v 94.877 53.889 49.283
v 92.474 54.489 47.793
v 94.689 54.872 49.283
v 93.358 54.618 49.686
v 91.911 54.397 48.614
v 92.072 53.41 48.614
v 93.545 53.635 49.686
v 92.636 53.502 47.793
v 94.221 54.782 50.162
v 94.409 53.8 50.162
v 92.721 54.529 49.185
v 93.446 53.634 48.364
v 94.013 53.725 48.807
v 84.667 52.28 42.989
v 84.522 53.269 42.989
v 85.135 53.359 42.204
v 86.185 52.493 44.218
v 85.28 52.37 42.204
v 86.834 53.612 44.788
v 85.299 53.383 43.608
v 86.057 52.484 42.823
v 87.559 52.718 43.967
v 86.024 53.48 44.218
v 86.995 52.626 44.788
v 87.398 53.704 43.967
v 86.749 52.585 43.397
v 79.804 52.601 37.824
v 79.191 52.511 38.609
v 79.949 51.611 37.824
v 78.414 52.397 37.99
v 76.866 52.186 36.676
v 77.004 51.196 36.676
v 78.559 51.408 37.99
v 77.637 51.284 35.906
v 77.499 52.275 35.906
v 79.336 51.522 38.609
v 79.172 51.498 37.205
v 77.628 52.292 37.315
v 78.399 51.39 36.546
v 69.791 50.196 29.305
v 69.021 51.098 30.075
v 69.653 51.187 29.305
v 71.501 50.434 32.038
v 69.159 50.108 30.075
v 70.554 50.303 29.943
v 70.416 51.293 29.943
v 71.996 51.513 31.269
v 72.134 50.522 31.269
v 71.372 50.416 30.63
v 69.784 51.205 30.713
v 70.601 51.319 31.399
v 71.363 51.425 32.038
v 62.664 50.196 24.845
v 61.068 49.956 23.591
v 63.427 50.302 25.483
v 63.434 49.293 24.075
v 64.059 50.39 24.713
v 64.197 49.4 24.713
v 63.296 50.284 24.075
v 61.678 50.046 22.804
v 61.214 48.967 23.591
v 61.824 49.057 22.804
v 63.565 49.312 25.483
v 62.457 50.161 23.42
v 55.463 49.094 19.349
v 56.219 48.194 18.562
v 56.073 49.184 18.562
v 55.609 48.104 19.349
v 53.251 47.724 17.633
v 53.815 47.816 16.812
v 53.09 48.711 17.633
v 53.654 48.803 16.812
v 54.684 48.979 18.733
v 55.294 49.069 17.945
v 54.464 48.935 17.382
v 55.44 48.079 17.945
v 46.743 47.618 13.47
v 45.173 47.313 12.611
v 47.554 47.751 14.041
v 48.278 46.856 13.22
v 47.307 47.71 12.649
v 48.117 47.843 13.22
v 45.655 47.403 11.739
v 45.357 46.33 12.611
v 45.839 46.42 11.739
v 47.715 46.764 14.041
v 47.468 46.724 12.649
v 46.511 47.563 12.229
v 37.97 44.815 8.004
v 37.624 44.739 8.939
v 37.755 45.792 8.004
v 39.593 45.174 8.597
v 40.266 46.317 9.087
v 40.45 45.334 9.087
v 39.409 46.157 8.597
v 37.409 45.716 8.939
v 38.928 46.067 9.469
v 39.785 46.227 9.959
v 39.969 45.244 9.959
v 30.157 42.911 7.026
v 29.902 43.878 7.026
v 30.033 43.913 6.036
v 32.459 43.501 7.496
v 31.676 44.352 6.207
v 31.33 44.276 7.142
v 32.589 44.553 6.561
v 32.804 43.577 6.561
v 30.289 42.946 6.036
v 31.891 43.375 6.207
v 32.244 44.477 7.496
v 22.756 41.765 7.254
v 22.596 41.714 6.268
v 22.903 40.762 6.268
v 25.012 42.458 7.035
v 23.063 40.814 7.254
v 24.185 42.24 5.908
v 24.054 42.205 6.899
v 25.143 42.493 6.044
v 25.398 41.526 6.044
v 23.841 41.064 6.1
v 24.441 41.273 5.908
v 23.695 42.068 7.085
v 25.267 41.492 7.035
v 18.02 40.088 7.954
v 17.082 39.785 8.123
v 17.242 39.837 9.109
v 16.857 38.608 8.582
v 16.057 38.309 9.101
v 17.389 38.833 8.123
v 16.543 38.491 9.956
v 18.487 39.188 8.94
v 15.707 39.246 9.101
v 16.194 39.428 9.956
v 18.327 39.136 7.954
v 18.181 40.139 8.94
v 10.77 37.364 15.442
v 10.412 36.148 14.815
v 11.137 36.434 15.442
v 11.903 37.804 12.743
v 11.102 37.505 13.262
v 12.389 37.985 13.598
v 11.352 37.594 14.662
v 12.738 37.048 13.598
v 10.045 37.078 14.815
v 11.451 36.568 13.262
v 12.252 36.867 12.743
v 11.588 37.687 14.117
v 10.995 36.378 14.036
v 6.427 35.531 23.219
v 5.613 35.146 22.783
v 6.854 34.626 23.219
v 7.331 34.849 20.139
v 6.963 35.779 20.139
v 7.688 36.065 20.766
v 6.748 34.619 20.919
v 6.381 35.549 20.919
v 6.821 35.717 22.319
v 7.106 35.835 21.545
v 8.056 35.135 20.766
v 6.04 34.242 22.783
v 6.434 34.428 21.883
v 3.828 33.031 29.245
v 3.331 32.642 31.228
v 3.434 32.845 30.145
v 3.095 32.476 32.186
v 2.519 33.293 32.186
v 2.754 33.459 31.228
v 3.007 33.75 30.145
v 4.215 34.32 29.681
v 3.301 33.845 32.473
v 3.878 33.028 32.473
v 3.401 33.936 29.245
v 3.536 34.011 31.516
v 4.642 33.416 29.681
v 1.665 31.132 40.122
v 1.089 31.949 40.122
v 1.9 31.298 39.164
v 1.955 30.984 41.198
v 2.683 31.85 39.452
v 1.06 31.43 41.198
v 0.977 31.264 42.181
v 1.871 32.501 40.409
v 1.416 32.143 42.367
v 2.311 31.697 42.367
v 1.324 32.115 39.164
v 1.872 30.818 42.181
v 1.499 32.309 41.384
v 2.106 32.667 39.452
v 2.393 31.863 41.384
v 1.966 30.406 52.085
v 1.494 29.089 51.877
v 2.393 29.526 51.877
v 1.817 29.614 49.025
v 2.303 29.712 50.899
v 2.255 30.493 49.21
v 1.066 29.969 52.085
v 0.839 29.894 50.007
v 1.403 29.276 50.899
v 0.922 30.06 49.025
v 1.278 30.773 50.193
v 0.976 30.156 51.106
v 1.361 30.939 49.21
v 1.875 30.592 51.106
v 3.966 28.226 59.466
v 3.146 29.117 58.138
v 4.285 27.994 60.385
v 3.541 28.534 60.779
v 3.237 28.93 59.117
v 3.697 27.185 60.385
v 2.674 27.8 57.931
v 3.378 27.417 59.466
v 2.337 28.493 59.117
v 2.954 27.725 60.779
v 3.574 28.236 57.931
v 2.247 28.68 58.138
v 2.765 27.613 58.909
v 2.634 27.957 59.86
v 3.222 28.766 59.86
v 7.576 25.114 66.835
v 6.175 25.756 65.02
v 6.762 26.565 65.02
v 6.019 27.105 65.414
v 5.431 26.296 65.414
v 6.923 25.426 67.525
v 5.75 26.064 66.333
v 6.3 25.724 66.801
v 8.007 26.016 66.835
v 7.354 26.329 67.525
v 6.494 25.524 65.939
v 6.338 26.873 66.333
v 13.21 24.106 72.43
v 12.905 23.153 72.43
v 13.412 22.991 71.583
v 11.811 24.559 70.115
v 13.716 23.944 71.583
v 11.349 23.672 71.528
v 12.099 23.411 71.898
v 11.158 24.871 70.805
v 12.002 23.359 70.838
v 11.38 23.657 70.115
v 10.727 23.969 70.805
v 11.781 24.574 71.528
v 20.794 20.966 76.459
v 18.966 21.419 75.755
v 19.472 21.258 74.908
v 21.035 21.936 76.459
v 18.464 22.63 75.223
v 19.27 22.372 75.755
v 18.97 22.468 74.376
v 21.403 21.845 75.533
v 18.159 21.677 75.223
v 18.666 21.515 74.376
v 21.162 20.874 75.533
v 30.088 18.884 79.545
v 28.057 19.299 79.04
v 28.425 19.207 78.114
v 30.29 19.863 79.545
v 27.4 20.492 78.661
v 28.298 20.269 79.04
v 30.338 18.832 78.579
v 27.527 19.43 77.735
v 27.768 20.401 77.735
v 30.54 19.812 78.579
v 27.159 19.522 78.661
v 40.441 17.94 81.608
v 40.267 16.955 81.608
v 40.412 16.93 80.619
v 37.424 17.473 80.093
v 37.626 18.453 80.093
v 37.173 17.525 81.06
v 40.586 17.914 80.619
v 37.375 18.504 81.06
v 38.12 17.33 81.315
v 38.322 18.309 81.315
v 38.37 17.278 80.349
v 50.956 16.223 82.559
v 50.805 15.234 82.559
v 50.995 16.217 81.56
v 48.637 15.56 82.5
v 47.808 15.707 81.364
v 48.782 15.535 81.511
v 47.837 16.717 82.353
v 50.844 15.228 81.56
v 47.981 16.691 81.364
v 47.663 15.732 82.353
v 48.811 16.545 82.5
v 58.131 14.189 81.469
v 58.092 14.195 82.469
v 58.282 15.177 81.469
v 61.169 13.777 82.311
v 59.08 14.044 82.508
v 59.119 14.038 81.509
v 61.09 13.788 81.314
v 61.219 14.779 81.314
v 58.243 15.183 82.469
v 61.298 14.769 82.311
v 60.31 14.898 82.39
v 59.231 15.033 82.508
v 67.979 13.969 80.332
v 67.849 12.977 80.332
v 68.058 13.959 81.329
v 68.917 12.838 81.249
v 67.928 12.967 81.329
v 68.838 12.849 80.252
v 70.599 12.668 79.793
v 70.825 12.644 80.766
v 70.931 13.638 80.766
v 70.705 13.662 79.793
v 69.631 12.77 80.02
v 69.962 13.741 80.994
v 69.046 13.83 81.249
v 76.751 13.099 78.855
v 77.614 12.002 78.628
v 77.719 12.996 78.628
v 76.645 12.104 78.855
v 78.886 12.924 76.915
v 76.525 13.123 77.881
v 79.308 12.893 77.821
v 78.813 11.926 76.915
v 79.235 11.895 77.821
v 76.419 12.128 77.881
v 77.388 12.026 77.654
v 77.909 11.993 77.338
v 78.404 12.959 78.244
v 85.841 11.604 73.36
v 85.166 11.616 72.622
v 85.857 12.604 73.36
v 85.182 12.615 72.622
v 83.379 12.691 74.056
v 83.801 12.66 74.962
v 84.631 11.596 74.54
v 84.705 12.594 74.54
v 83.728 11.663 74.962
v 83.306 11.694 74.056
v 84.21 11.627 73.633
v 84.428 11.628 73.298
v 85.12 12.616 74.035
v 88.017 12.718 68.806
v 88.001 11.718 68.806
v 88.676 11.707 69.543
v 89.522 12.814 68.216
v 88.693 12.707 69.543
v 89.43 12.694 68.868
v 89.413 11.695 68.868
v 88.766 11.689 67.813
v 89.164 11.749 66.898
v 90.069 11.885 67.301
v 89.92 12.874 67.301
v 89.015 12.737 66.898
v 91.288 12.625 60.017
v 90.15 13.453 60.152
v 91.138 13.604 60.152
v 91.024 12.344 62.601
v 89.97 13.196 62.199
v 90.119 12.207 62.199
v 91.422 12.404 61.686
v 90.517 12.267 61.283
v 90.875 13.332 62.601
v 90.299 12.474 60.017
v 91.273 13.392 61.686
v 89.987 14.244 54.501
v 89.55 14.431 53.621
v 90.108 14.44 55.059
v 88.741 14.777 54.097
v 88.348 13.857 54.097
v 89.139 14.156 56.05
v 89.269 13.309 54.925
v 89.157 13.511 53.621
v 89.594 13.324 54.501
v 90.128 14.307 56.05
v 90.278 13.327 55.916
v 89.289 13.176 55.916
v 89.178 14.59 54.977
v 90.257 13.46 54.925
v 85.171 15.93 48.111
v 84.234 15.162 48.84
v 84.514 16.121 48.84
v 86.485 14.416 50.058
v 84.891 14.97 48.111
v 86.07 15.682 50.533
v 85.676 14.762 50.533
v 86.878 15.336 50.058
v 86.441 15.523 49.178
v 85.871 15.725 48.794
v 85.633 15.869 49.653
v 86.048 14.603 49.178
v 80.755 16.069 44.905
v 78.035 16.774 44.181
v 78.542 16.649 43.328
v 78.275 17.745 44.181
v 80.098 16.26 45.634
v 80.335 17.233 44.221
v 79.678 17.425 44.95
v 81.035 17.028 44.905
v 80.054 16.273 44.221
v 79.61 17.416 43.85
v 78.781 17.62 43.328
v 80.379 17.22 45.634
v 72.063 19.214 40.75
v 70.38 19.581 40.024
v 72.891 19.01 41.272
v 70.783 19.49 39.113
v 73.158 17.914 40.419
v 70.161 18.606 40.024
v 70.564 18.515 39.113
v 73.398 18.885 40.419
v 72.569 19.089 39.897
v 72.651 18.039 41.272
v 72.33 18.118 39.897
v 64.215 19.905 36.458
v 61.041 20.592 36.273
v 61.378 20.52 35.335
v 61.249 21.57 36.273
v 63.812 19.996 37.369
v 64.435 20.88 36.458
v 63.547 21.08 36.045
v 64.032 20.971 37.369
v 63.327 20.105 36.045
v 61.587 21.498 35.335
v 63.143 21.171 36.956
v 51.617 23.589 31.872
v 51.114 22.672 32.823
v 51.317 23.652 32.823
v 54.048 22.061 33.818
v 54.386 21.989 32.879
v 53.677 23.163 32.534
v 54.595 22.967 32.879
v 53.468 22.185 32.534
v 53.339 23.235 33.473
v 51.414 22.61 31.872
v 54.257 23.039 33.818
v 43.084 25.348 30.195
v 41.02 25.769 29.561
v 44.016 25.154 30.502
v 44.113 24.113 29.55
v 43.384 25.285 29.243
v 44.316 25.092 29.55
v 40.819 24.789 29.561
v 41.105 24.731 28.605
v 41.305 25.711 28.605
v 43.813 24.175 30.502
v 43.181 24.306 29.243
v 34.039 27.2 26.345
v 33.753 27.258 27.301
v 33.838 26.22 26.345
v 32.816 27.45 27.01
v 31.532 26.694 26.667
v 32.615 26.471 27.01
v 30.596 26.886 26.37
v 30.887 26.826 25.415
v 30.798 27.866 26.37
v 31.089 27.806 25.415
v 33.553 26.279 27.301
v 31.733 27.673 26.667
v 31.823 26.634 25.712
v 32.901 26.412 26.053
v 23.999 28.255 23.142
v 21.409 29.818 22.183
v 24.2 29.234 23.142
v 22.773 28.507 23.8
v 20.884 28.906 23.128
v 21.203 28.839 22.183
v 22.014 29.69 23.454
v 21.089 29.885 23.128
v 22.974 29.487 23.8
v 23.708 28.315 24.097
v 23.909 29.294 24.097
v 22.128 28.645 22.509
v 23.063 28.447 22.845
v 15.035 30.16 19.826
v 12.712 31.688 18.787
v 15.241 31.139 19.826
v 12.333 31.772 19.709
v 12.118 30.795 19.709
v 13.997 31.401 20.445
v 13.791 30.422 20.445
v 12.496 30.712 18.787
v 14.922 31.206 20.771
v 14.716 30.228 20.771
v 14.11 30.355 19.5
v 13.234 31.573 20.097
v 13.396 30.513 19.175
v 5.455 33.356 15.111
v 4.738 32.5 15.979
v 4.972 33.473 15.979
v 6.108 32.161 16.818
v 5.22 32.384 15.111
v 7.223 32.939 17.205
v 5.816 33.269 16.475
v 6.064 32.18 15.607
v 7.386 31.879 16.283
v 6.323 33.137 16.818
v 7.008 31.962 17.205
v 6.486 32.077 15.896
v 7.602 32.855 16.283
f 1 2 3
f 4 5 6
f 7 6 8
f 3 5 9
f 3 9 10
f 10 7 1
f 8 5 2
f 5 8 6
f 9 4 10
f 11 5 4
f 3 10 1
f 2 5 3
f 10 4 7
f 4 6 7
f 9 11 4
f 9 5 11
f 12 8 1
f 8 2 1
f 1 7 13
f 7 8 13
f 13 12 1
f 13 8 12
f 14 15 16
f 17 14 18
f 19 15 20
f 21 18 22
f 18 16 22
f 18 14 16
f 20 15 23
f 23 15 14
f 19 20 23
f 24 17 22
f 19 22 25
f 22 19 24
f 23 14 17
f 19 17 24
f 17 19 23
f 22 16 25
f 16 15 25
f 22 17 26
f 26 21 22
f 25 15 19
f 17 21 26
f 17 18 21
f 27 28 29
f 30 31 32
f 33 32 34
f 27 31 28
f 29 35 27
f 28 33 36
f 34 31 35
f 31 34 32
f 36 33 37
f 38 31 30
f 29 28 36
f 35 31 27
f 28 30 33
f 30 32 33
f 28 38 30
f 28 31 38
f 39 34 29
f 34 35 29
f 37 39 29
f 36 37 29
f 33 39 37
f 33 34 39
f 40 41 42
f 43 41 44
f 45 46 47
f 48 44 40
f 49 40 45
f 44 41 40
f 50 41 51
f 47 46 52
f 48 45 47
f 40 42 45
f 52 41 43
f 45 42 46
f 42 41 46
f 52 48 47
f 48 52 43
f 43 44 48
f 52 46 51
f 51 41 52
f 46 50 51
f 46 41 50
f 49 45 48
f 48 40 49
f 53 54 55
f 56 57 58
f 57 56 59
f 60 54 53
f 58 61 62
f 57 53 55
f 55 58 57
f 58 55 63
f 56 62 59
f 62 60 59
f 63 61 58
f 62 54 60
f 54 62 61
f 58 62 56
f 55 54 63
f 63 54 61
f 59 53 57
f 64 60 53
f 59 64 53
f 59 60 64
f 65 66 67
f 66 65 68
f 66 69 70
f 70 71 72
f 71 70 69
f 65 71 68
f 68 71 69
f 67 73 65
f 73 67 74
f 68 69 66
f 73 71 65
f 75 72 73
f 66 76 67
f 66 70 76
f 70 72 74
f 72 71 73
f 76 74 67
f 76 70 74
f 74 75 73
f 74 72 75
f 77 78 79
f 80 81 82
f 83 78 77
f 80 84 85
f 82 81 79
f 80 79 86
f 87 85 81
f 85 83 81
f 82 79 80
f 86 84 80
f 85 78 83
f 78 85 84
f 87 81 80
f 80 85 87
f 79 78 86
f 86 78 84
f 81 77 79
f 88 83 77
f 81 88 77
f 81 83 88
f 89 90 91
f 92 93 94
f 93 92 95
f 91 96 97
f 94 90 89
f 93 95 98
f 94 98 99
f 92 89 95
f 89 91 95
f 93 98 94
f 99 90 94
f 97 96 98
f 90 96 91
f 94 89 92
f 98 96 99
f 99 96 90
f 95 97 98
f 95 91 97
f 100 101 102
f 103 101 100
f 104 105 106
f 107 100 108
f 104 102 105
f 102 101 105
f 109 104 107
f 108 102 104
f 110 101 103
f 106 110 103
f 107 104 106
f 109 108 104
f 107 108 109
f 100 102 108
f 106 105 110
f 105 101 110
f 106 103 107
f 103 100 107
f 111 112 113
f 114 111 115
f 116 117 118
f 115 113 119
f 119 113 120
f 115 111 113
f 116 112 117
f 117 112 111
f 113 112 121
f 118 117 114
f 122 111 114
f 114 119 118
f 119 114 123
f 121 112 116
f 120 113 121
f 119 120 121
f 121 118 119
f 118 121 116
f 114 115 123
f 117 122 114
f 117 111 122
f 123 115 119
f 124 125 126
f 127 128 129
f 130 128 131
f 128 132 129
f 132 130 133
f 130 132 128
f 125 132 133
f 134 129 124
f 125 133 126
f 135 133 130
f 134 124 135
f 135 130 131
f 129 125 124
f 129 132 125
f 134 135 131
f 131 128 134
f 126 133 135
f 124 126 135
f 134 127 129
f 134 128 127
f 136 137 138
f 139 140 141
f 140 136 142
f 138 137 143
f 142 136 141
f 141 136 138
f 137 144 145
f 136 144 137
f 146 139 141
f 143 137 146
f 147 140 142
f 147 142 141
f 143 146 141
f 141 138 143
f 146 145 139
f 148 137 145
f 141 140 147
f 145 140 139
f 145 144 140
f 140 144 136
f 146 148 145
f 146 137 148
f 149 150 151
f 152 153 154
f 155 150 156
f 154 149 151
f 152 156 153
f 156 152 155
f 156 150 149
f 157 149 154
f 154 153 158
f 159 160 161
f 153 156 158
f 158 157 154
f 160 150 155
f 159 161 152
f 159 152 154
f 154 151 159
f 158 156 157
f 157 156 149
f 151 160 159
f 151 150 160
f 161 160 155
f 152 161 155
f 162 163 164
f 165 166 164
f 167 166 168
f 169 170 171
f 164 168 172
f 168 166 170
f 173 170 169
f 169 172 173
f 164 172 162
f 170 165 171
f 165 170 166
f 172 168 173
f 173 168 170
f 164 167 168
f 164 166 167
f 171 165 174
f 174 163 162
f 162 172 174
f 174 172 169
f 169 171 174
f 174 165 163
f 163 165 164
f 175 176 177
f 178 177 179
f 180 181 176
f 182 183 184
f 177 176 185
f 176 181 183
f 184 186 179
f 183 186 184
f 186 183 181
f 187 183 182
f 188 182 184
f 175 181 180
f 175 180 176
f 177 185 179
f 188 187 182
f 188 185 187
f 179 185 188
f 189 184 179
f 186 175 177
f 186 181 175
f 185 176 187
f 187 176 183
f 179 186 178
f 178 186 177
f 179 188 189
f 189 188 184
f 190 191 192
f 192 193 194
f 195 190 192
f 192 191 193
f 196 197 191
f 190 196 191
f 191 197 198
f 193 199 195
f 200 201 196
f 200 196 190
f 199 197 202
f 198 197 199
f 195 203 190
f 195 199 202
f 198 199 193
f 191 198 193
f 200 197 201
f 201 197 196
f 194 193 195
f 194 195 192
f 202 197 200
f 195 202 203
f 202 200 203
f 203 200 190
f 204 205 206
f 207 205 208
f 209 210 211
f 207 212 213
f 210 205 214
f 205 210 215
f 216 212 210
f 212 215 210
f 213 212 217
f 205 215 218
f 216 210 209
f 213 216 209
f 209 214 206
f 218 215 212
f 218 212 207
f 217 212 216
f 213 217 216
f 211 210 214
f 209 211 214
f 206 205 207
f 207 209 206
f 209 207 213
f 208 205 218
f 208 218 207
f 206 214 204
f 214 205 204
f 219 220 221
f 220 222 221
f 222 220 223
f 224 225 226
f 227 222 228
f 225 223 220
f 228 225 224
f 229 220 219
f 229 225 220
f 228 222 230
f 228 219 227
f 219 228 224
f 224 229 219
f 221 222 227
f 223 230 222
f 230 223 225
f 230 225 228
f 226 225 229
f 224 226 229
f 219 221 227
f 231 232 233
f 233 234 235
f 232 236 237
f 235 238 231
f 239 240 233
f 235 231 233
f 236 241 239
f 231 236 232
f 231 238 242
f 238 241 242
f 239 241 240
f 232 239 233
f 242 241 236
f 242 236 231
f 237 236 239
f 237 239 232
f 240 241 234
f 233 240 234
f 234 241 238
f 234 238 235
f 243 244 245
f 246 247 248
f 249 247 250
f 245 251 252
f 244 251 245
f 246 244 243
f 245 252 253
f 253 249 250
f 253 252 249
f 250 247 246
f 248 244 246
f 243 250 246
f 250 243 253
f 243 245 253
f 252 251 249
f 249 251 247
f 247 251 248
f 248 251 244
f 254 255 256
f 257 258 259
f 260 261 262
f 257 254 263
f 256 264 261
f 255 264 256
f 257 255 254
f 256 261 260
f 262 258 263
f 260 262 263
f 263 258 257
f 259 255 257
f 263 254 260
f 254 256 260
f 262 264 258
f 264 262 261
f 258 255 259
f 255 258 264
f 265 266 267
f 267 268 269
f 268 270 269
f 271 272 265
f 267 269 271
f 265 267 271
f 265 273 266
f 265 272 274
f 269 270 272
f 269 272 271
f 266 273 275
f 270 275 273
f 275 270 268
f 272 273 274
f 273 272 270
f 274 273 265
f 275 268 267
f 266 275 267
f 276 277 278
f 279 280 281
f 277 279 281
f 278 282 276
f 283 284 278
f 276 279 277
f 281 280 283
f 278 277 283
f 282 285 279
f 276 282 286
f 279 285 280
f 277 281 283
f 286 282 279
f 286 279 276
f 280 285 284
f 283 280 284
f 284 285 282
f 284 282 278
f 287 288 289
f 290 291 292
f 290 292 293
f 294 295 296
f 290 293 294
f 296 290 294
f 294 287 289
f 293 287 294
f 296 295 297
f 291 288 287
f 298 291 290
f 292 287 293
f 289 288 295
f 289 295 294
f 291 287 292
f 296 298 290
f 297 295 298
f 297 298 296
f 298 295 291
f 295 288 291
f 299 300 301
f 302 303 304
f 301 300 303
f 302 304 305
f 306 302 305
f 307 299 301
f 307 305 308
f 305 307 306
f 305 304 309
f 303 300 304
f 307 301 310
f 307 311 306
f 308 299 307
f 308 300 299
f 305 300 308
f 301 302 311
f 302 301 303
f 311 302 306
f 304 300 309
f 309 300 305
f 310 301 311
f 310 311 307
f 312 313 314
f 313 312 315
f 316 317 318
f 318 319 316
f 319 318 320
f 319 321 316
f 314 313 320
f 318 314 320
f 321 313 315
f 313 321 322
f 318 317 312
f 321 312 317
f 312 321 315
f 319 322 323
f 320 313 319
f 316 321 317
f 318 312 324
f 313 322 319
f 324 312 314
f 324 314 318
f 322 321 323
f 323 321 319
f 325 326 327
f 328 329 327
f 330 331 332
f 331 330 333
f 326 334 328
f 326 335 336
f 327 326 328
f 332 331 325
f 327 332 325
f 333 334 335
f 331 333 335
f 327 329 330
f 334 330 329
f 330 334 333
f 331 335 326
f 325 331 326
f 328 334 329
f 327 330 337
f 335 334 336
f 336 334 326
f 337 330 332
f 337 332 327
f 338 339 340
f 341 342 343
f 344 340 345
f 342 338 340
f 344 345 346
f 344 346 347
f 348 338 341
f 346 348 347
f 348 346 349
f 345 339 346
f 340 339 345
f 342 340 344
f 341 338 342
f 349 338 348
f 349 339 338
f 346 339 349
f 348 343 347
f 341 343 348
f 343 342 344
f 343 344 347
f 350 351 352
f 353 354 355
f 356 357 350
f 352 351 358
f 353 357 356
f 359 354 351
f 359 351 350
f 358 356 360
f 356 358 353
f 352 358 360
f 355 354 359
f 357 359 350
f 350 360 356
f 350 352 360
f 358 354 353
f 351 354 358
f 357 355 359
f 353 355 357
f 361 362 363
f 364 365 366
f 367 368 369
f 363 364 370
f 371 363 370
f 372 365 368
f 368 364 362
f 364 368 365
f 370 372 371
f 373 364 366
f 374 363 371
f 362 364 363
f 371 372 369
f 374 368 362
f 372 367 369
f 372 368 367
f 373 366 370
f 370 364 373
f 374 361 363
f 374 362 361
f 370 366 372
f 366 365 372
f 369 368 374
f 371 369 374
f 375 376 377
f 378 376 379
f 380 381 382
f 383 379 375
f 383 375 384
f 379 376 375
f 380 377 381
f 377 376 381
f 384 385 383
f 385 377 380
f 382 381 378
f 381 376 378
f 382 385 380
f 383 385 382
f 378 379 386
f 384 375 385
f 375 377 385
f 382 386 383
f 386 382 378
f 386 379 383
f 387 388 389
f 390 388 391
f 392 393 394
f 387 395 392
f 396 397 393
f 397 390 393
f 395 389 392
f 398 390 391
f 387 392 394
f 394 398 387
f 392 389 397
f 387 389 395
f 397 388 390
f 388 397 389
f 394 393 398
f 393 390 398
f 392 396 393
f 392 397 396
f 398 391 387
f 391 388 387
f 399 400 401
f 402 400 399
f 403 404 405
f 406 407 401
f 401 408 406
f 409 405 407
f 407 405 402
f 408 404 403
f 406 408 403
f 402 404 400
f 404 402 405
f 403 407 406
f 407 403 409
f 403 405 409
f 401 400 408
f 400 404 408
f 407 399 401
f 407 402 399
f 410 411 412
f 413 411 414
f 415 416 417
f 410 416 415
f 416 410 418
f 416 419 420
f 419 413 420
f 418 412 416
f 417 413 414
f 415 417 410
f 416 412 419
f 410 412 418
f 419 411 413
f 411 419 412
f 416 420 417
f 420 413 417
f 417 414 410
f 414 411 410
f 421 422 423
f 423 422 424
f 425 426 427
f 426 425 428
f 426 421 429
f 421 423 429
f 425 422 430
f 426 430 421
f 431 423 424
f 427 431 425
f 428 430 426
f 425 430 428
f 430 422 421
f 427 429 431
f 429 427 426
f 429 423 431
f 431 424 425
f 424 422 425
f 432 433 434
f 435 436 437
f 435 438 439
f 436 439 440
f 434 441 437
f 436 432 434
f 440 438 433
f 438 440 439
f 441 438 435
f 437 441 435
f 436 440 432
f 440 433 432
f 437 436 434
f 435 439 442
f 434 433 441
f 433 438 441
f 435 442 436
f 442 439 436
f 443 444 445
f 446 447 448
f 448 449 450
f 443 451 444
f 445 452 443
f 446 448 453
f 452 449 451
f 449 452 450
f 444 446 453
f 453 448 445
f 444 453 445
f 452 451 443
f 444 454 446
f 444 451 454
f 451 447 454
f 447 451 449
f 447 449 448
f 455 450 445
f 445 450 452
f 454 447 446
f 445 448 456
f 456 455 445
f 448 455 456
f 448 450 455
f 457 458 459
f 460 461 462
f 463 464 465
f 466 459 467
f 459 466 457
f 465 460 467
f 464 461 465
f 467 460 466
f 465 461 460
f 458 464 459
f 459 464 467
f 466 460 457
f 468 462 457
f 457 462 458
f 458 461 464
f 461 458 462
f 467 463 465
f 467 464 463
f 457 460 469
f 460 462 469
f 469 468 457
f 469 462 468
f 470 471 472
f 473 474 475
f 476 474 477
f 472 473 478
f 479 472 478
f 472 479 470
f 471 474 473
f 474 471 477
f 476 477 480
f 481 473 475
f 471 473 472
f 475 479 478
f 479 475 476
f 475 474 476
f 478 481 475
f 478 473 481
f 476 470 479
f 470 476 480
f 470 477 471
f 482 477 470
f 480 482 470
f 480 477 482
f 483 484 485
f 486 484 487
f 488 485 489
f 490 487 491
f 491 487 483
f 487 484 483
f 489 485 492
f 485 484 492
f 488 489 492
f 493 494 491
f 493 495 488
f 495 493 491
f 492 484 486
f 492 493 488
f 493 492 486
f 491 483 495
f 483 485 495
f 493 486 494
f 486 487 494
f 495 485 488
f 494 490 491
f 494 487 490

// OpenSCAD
$fn = 9;
t = 0.3;
v1 = 
 [
  for (t = [0: 4]) concat(rndc(t+1) * 100 )
];
v=(v1);
spl = v2spl(v, t);
//ShowControl(v);
spline(spl,40 ,gap=0.2){cube(1,center=true);}  ;
 *ShowSplControl(spl,t);
//echo(len3bz(spl[0]) + len3bz(spl[1]) + len3bz(spl[2]));
echo(v1);
L=len3spl(spl);

 



















//for(i=[0:len(v)-1]){echo(v2spl(v)[i]);color(rndc()){ShowControl(v2spl(v)[i]);extrudeT(v2spl(v)[i]);}}
module ShowControl(v) { // translate(t(v[0])) sphere(v[0][3]);
  if (len(v[0][0]) != undef) {
      ShowSplControl(v);
      } else
    for (i = [1: len(v) - 1]) {
      // vg  translate(t(v[i])) sphere(v[i][3]);
      hull() {
        translate(t(v[i])) sphere(1);
        translate(t(v[i - 1])) sphere(1);
      }
    }
}
module ShowSplControl(v) { // translate(t(v[0])) sphere(v[0][3]);
    for (i = [0: len(v) - 1]) {
      // vg  translate(t(v[i])) sphere(v[i][3]);
      hull() {
        translate(t(v[i][0])) sphere(1);
        translate(t(v[i][1])) sphere(1);
      }
      hull() {
        translate(t(v[i][2])) sphere(1);
        translate(t(v[i][3])) sphere(1);
      }
    }
}
module spline(v, d = 8, start = 0, stop = 1, twist = 0, gap = 1) {
 
L=len3spl(v);
    detail = L / d;
     det=1/d;
    for (ii = [start + det: det: stop]) {
       i=L*ii;
      if ($children > 0) {
        for (j = [0: $children - 1]) hull() {
          translate(t(spl2(i, v)))
           rotate(spl2euler(i, v))
          scale(spl2(i, v)[3]) rotate([twist * ii, 0, 0])  rotate([0, -90, 0])children(j);
          translate(t(spl2(i - detail * gap, v)))
          rotate(spl2euler(i - detail, v))
          scale(spl2(i - detail * gap, v)[3]) rotate([twist * (ii - det), 0, 0])  rotate([0, -90, 0])children(j);
        }
      } 

else {
        hull() {
          translate(t(spl2(i, v))) 
 rotate(spl2euler(i, v)) 
scale(spl2(i, v)[3]) rotate([twist * ii, 0, 0]) rotate([0, -90, 0]) sphere(1);
          translate(t(spl2(i - detail * gap, v))) 
rotate(spl2euler(i - detail * gap, v)) 
scale(spl2(i - detail * gap, v)[3]) rotate([twist * (ii - det), 0, 0]) rotate([0, -90, 0]) sphere(1);
        }
      }
    }
  }


function spl2(stop,v, p = 0) =
let(L=len3bz(v[p])) 
p + 1 > len(v) - 1 || stop < L ? 
bez2(stop / L,v[p]) 
:
 spl2( stop - L, v,p + 1);



function t(v) = [v[0], v[1], v[2]];

function v2spl(v, t = 0.3) =
let (L = len(v) - 1)[
  for (i = [0: L - 1]) let (prev = max(0, i - 1), next = min(L, i + 1), nnext = min(L, i + 2))
  let (M = len3(v[next] - v[i]), N0 = un(v[i] - v[prev]), N1 = un(v[next] - v[i]), N2 = un(v[nnext] - v[next]), N01 = un(N0 + N1) * M * t, N12 = un(N1 + N2) * M * t)[v[i], v[i] + N01, v[next] - N12, v[next]]];
function v2round(v, t = 0.01) =
let (L = len(v) - 1)[
  for (i = [0: L - 1])
 let (prev = max(0, i - 1), next = min(L, i + 1), nnext = min(L, i + 2))
[  lerp(v[i],  v[next],t),lerp(v[i],  v[next],1-t)]];

function un(v) = v / max(len3(v), 0.000001) * 1;

function len3(v) = sqrt(pow(v[0], 2) + pow(v[1], 2) + pow(v[2], 2));


function bez2(t, v) = (len(v) > 2) ? bez2(t, [
  for (i = [0: len(v) - 2]) v[i] * (1 - t) + v[i + 1] * (t)
]): v[0] * (1 - t) + v[1] * (t);

function bez2euler(i, v) = [0, -asin(bez2v(i, v)[2]), atan2(bez2xy(bez2v(i, v))[1], bez2xy(bez2v(i, v))[0])];

function bez2xy(v) = lim31(1, [v[0], v[1], 0]); // down xy projection
function bez2v(i, v) = lim31(1, bez2(i - 0.0001, v) - bez2(i, v)); // unit vector at i

function spl2euler(i, v) = [0, -asin(spl2v(i, v)[2]), atan2(spl2xy(spl2v(i, v))[1], spl2xy(spl2v(i, v))[0])];

function spl2xy(v) = lim31(1, [v[0], v[1], 0]); // down xy projection
function spl2v(i, v) = lim31(1, spl2(i - 0.0001, v) - spl2(i, v)); // unit vector at i
function lim31(l, v) = v / len3(v) * l;

function len3bz(v, precision = 0.01, t = 0, acc = 0) = t > 1 ? acc : len3bz(v, precision, t + precision, acc + len3(bez2(t, v) - bez2(t + precision, v)));

function len3v(v, acc = 0, p = 0) = p + 1 > len(v) - 1 ? acc : len3v(v, acc + len3(v[p] - v[p + 1]), p + 1);

function len3spl(v, acc = 0, p = 0) = p + 1 > len(v) ? acc : len3spl(v, acc + len3bz(v[p]), p + 1);

function v2t(v, stop, p = 0) = p + 1 > len(v) - 1 || stop < len3(v[p] - v[p + 1]) ? v[p] + un(v[p + 1] - v[p]) * stop : v2t(v, stop - len3(v[p] - v[p + 1]), p + 1);

function bz2t(v, stop, precision = 0.01, t = 0, acc = 0) = acc >= stop || t > 1 ? t : bz2t(v, stop, precision, t + precision, acc + len3(bez2(t, v) - bez2(t + precision, v)));




function lerp(start, end, bias) = (end * bias + start * (1 - bias));

function rnd(a = 0, b = 1) = (rands(min(a, b), max(a, b), 1)[0]);
function rndc(seed) = [rands(0, 1, 1,seed)[0], rands(0, 1, 1,seed+100)[0], rands(0, 1, 1,seed+200)[0]];

function bzplot(v, res) = [
  for (i = [0: 1 / res: 1.001]) bez2(i, v)
];

function SC3(a) =
let (b = clamp(a))(b * b * (3 - 2 * b));

function clamp(a, b = 0, c = 10) = min(max(a, b), c);
function flatten(list) = [ for (i = list, v = i) v ];
function gauss(i, n = 0) = n > 0 ?
  let (x = gauss(i, n - 1)) x + (x - SC3(x)) : let (x = i) x + (x - SC3(x));
